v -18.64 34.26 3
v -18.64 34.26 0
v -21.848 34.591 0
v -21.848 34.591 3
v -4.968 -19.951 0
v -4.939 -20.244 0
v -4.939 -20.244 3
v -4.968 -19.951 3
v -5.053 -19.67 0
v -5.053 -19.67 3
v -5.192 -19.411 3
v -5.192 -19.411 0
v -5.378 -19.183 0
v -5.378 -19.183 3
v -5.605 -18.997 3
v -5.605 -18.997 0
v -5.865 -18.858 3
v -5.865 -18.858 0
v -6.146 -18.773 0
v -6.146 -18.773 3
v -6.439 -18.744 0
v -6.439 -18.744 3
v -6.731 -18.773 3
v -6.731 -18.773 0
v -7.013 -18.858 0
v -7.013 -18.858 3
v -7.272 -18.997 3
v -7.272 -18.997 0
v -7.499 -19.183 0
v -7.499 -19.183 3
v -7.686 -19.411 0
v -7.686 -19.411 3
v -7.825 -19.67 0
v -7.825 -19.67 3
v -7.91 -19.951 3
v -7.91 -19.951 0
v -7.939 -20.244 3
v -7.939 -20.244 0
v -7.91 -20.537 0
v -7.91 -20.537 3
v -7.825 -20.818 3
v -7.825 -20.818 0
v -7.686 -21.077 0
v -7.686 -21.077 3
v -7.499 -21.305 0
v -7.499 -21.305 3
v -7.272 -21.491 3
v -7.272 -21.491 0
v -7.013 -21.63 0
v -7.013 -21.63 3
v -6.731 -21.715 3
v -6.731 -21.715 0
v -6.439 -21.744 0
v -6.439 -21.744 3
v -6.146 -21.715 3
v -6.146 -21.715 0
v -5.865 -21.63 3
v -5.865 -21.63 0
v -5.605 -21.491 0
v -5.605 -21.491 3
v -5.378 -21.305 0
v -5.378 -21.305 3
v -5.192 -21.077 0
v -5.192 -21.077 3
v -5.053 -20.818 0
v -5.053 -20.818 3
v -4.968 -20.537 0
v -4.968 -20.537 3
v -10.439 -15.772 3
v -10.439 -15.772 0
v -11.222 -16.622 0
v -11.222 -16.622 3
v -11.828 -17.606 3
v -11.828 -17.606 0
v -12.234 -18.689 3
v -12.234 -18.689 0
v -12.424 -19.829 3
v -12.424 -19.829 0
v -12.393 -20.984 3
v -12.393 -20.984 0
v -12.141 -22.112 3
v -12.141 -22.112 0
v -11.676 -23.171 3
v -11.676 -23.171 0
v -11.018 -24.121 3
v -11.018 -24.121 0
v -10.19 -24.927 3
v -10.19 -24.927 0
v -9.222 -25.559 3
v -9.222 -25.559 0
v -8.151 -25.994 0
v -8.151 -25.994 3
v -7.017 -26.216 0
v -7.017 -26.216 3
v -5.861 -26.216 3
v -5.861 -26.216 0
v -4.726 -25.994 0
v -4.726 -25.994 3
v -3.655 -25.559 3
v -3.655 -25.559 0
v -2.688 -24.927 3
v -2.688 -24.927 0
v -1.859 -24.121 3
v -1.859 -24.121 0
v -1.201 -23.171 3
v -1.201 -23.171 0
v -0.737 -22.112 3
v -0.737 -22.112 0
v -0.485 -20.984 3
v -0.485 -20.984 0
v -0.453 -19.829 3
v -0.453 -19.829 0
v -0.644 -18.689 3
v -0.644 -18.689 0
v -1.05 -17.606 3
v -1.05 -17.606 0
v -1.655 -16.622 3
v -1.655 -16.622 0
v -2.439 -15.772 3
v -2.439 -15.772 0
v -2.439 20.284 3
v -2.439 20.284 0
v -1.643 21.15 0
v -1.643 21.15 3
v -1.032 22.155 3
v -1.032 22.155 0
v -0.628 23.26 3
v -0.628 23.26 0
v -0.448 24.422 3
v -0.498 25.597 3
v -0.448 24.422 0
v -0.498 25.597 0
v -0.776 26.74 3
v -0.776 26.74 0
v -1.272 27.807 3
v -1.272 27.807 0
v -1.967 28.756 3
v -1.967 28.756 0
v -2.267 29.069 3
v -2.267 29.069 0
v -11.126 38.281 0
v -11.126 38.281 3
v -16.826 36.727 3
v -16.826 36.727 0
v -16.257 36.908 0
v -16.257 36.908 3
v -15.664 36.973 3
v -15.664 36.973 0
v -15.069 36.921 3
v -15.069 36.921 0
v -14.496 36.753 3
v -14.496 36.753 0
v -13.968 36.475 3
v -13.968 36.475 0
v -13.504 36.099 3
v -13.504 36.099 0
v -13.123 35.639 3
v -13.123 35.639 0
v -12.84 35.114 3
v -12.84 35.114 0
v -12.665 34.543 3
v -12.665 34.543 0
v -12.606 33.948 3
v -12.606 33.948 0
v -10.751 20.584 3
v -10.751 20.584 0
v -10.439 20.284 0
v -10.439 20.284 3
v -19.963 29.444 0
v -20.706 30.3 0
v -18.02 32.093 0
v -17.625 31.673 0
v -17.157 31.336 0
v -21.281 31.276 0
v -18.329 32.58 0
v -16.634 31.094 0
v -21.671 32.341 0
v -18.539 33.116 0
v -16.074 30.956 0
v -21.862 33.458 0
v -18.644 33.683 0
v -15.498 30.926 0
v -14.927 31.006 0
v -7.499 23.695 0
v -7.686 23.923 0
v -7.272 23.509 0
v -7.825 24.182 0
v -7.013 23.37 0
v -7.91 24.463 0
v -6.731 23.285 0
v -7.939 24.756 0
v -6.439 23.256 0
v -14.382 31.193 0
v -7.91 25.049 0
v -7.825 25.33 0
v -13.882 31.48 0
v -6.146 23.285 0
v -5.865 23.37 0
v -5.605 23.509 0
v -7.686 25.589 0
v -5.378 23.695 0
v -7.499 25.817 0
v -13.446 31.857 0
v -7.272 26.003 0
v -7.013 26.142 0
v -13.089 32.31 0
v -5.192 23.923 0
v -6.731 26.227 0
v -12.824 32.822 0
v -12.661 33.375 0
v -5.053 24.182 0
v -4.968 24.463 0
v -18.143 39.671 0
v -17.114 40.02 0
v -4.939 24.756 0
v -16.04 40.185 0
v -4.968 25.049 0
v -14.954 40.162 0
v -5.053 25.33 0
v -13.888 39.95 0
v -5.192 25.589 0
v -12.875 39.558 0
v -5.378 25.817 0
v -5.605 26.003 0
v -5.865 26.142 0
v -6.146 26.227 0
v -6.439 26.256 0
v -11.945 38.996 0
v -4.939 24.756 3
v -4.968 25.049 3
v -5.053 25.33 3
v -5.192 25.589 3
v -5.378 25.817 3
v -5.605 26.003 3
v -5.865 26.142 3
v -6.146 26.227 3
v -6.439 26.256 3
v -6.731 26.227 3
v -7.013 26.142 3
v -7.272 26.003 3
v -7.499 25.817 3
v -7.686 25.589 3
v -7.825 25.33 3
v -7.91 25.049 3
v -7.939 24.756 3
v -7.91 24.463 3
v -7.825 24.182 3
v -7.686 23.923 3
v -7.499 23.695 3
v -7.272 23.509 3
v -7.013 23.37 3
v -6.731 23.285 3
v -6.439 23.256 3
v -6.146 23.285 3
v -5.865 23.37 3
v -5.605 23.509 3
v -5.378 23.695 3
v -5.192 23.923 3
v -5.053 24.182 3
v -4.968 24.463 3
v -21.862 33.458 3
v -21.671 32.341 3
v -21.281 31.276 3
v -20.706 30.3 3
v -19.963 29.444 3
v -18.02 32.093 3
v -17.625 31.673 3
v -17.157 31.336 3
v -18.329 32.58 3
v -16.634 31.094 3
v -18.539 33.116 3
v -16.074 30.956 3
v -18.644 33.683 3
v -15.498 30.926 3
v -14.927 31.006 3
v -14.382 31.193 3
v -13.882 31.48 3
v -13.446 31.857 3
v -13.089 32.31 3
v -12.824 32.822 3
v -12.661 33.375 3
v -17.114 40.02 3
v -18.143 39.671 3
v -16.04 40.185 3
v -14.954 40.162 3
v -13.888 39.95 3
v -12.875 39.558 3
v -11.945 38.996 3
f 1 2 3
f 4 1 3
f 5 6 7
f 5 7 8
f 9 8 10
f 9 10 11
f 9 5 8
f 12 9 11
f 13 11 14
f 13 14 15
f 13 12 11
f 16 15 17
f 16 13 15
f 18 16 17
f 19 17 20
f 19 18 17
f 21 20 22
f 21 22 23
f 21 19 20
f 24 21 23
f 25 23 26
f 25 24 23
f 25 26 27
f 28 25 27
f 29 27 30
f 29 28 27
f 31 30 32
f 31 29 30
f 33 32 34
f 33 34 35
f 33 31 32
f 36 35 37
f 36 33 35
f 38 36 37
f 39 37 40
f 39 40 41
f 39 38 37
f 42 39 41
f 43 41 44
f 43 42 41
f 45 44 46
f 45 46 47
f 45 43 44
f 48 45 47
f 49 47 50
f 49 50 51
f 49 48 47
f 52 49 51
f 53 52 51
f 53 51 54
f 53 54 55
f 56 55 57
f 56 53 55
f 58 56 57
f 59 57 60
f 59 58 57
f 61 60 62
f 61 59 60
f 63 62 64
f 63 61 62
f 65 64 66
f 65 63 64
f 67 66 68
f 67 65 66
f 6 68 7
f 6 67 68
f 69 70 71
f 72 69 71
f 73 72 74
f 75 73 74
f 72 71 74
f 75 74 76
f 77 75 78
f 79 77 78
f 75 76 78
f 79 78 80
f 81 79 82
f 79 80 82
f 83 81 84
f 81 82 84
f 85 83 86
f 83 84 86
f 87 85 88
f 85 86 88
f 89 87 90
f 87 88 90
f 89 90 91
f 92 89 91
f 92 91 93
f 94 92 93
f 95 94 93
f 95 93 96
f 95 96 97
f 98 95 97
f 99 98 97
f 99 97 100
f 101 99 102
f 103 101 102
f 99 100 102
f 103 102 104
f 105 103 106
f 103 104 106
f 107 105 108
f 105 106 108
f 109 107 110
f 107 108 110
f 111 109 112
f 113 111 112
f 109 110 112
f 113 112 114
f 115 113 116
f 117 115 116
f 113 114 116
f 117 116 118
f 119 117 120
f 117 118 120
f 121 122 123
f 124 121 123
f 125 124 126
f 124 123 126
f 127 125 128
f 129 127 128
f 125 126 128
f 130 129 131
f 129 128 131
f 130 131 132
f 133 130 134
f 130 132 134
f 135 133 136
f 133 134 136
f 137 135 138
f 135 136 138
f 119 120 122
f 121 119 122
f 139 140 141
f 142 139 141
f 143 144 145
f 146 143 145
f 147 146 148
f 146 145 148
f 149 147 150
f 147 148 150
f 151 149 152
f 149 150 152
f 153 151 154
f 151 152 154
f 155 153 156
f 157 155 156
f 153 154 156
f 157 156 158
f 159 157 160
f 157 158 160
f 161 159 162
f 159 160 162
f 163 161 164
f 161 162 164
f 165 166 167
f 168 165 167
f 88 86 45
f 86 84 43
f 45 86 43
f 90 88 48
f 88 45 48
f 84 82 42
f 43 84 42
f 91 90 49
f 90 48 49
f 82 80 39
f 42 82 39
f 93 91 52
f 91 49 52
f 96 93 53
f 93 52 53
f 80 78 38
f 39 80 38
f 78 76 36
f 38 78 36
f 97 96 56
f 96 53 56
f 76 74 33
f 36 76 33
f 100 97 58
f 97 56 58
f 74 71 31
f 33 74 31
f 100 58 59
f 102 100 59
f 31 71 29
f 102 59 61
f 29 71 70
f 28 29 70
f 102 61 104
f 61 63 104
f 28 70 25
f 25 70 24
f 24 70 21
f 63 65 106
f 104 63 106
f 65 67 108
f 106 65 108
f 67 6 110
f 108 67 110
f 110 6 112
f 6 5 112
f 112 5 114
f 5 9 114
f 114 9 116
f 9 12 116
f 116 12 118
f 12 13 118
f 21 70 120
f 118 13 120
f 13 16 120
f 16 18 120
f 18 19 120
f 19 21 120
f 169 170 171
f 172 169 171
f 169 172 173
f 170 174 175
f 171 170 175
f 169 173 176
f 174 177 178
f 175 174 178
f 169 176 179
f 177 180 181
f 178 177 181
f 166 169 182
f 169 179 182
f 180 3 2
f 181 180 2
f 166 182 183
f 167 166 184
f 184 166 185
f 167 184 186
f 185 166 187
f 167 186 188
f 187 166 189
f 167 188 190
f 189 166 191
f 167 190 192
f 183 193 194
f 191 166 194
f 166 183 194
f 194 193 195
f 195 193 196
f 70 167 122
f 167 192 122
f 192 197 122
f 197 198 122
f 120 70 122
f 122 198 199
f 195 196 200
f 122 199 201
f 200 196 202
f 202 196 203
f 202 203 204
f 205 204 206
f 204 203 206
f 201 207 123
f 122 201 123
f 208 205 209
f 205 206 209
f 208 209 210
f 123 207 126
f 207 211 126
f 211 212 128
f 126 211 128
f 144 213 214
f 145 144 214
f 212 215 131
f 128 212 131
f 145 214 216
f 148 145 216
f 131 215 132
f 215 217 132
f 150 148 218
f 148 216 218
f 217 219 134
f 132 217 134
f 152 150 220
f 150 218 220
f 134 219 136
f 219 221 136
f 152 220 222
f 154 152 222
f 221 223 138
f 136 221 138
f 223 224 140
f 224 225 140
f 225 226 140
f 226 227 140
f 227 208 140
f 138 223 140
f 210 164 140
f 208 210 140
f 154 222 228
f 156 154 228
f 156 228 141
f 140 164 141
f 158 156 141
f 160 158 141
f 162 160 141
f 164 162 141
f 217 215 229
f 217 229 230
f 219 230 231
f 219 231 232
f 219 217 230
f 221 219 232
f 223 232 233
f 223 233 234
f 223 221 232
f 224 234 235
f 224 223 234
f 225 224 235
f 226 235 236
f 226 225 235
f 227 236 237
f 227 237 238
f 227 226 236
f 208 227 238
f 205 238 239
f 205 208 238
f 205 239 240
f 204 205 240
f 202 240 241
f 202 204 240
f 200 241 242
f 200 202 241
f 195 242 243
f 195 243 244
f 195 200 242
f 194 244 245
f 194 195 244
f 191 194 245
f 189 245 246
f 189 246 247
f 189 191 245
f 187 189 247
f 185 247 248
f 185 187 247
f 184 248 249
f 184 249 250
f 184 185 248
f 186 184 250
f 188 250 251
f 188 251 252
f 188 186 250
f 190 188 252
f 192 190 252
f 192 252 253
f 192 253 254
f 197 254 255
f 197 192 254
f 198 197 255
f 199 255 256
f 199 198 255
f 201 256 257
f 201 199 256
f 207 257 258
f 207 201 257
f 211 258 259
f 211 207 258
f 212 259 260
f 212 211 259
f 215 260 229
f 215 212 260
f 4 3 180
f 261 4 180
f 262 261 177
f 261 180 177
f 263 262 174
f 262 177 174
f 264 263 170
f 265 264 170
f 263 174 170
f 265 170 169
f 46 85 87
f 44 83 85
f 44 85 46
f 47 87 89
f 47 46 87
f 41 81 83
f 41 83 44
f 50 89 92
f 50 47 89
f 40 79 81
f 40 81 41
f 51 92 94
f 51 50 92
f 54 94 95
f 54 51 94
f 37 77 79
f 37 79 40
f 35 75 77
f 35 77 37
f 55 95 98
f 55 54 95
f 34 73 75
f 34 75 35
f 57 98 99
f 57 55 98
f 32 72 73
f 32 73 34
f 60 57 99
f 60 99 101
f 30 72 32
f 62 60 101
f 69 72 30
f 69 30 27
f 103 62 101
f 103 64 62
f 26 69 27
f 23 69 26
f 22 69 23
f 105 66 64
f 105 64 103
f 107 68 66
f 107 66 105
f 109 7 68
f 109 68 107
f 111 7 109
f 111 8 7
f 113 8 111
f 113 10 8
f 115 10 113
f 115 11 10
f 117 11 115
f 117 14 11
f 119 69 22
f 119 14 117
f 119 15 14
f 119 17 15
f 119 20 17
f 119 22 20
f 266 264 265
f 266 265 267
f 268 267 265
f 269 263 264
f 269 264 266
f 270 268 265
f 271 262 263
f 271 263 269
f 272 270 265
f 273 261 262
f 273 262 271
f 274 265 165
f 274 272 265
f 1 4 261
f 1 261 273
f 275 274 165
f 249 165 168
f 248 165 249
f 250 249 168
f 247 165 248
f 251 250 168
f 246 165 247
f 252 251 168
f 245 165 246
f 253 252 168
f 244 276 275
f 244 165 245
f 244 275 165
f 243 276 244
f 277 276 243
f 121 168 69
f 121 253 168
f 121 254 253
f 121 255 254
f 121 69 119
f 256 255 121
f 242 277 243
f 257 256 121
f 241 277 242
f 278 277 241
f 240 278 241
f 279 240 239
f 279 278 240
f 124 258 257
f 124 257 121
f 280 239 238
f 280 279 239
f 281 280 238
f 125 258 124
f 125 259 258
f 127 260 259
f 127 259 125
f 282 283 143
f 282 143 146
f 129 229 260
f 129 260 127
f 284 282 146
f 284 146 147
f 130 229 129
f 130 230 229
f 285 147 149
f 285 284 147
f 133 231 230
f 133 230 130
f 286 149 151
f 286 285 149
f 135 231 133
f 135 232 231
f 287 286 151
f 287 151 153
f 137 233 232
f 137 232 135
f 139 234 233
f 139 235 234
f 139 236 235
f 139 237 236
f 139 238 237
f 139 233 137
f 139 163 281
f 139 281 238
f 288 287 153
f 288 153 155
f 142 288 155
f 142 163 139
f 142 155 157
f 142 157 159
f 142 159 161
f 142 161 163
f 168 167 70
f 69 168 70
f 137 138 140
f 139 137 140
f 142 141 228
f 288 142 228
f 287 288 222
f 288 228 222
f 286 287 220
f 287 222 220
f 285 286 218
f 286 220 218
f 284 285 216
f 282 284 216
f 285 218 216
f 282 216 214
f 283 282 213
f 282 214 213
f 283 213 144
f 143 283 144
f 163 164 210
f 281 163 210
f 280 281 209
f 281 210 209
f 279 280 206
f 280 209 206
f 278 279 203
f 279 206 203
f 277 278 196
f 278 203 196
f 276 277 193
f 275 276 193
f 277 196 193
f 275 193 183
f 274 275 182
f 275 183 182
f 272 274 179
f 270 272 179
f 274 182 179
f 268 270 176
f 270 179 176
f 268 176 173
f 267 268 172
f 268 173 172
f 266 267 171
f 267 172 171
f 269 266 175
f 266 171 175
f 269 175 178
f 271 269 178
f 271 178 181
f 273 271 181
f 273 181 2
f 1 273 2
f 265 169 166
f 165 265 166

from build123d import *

# Parameters (mm, degrees)
ESQUISSE1_R        = 1.5
BOSS_EXTRU_1_DEPTH = 3


with BuildPart() as part:
    # Esquisse1 → Boss.-Extru.1 (new body)
    with BuildSketch(Plane.XY):
        with BuildLine():
            Line((-10.438754388, 20.283961606), (-10.438754388, -0.112631187))
            Line((-10.438754388, -0.112631187), (-10.438754388, -15.771766484))
            ThreePointArc((-10.438754388, -15.771766484), (-6.438754388, -26.243902439), (-2.438754388, -15.771766484))
            Line((-2.438754388, -15.771766484), (-2.438754388, 20.283961606))
            ThreePointArc((-2.438754388, 20.283961606), (-0.448049603, 24.422247026), (-1.966618433, 28.756097561))
            Line((-1.966618433, 28.756097561), (-2.267139353, 29.068594286))
            Line((-2.267139353, 29.068594286), (-11.126247763, 38.28073952))
            ThreePointArc((-11.126247763, 38.28073952), (-14.416088568, 40.079239654), (-18.143198107, 39.671428739))
            Line((-18.143198107, 39.671428739), (-16.826364742, 36.727346795))
            ThreePointArc((-16.826364742, 36.727346795), (-13.967550368, 36.474962725), (-12.606142543, 33.948485716))
            ThreePointArc((-12.606142543, 33.948485716), (-15.786873062, 30.92749697), (-18.640108166, 34.259533746))
            Line((-18.640108166, 34.259533746), (-21.848013666, 34.591146934))
            ThreePointArc((-21.848013666, 34.591146934), (-21.500157994, 31.799728487), (-19.963396347, 29.443590936))
            Line((-19.963396347, 29.443590936), (-10.751251112, 20.584482526))
            Line((-10.751251112, 20.584482526), (-10.438754388, 20.283961606))
        make_face()
        with Locations((-6.438754388, -20.243902439)):
            Circle(ESQUISSE1_R, mode=Mode.SUBTRACT)
        with Locations((-6.438754388, 24.756097561)):
            Circle(ESQUISSE1_R, mode=Mode.SUBTRACT)
    extrude(amount=BOSS_EXTRU_1_DEPTH)


solid = part.part
